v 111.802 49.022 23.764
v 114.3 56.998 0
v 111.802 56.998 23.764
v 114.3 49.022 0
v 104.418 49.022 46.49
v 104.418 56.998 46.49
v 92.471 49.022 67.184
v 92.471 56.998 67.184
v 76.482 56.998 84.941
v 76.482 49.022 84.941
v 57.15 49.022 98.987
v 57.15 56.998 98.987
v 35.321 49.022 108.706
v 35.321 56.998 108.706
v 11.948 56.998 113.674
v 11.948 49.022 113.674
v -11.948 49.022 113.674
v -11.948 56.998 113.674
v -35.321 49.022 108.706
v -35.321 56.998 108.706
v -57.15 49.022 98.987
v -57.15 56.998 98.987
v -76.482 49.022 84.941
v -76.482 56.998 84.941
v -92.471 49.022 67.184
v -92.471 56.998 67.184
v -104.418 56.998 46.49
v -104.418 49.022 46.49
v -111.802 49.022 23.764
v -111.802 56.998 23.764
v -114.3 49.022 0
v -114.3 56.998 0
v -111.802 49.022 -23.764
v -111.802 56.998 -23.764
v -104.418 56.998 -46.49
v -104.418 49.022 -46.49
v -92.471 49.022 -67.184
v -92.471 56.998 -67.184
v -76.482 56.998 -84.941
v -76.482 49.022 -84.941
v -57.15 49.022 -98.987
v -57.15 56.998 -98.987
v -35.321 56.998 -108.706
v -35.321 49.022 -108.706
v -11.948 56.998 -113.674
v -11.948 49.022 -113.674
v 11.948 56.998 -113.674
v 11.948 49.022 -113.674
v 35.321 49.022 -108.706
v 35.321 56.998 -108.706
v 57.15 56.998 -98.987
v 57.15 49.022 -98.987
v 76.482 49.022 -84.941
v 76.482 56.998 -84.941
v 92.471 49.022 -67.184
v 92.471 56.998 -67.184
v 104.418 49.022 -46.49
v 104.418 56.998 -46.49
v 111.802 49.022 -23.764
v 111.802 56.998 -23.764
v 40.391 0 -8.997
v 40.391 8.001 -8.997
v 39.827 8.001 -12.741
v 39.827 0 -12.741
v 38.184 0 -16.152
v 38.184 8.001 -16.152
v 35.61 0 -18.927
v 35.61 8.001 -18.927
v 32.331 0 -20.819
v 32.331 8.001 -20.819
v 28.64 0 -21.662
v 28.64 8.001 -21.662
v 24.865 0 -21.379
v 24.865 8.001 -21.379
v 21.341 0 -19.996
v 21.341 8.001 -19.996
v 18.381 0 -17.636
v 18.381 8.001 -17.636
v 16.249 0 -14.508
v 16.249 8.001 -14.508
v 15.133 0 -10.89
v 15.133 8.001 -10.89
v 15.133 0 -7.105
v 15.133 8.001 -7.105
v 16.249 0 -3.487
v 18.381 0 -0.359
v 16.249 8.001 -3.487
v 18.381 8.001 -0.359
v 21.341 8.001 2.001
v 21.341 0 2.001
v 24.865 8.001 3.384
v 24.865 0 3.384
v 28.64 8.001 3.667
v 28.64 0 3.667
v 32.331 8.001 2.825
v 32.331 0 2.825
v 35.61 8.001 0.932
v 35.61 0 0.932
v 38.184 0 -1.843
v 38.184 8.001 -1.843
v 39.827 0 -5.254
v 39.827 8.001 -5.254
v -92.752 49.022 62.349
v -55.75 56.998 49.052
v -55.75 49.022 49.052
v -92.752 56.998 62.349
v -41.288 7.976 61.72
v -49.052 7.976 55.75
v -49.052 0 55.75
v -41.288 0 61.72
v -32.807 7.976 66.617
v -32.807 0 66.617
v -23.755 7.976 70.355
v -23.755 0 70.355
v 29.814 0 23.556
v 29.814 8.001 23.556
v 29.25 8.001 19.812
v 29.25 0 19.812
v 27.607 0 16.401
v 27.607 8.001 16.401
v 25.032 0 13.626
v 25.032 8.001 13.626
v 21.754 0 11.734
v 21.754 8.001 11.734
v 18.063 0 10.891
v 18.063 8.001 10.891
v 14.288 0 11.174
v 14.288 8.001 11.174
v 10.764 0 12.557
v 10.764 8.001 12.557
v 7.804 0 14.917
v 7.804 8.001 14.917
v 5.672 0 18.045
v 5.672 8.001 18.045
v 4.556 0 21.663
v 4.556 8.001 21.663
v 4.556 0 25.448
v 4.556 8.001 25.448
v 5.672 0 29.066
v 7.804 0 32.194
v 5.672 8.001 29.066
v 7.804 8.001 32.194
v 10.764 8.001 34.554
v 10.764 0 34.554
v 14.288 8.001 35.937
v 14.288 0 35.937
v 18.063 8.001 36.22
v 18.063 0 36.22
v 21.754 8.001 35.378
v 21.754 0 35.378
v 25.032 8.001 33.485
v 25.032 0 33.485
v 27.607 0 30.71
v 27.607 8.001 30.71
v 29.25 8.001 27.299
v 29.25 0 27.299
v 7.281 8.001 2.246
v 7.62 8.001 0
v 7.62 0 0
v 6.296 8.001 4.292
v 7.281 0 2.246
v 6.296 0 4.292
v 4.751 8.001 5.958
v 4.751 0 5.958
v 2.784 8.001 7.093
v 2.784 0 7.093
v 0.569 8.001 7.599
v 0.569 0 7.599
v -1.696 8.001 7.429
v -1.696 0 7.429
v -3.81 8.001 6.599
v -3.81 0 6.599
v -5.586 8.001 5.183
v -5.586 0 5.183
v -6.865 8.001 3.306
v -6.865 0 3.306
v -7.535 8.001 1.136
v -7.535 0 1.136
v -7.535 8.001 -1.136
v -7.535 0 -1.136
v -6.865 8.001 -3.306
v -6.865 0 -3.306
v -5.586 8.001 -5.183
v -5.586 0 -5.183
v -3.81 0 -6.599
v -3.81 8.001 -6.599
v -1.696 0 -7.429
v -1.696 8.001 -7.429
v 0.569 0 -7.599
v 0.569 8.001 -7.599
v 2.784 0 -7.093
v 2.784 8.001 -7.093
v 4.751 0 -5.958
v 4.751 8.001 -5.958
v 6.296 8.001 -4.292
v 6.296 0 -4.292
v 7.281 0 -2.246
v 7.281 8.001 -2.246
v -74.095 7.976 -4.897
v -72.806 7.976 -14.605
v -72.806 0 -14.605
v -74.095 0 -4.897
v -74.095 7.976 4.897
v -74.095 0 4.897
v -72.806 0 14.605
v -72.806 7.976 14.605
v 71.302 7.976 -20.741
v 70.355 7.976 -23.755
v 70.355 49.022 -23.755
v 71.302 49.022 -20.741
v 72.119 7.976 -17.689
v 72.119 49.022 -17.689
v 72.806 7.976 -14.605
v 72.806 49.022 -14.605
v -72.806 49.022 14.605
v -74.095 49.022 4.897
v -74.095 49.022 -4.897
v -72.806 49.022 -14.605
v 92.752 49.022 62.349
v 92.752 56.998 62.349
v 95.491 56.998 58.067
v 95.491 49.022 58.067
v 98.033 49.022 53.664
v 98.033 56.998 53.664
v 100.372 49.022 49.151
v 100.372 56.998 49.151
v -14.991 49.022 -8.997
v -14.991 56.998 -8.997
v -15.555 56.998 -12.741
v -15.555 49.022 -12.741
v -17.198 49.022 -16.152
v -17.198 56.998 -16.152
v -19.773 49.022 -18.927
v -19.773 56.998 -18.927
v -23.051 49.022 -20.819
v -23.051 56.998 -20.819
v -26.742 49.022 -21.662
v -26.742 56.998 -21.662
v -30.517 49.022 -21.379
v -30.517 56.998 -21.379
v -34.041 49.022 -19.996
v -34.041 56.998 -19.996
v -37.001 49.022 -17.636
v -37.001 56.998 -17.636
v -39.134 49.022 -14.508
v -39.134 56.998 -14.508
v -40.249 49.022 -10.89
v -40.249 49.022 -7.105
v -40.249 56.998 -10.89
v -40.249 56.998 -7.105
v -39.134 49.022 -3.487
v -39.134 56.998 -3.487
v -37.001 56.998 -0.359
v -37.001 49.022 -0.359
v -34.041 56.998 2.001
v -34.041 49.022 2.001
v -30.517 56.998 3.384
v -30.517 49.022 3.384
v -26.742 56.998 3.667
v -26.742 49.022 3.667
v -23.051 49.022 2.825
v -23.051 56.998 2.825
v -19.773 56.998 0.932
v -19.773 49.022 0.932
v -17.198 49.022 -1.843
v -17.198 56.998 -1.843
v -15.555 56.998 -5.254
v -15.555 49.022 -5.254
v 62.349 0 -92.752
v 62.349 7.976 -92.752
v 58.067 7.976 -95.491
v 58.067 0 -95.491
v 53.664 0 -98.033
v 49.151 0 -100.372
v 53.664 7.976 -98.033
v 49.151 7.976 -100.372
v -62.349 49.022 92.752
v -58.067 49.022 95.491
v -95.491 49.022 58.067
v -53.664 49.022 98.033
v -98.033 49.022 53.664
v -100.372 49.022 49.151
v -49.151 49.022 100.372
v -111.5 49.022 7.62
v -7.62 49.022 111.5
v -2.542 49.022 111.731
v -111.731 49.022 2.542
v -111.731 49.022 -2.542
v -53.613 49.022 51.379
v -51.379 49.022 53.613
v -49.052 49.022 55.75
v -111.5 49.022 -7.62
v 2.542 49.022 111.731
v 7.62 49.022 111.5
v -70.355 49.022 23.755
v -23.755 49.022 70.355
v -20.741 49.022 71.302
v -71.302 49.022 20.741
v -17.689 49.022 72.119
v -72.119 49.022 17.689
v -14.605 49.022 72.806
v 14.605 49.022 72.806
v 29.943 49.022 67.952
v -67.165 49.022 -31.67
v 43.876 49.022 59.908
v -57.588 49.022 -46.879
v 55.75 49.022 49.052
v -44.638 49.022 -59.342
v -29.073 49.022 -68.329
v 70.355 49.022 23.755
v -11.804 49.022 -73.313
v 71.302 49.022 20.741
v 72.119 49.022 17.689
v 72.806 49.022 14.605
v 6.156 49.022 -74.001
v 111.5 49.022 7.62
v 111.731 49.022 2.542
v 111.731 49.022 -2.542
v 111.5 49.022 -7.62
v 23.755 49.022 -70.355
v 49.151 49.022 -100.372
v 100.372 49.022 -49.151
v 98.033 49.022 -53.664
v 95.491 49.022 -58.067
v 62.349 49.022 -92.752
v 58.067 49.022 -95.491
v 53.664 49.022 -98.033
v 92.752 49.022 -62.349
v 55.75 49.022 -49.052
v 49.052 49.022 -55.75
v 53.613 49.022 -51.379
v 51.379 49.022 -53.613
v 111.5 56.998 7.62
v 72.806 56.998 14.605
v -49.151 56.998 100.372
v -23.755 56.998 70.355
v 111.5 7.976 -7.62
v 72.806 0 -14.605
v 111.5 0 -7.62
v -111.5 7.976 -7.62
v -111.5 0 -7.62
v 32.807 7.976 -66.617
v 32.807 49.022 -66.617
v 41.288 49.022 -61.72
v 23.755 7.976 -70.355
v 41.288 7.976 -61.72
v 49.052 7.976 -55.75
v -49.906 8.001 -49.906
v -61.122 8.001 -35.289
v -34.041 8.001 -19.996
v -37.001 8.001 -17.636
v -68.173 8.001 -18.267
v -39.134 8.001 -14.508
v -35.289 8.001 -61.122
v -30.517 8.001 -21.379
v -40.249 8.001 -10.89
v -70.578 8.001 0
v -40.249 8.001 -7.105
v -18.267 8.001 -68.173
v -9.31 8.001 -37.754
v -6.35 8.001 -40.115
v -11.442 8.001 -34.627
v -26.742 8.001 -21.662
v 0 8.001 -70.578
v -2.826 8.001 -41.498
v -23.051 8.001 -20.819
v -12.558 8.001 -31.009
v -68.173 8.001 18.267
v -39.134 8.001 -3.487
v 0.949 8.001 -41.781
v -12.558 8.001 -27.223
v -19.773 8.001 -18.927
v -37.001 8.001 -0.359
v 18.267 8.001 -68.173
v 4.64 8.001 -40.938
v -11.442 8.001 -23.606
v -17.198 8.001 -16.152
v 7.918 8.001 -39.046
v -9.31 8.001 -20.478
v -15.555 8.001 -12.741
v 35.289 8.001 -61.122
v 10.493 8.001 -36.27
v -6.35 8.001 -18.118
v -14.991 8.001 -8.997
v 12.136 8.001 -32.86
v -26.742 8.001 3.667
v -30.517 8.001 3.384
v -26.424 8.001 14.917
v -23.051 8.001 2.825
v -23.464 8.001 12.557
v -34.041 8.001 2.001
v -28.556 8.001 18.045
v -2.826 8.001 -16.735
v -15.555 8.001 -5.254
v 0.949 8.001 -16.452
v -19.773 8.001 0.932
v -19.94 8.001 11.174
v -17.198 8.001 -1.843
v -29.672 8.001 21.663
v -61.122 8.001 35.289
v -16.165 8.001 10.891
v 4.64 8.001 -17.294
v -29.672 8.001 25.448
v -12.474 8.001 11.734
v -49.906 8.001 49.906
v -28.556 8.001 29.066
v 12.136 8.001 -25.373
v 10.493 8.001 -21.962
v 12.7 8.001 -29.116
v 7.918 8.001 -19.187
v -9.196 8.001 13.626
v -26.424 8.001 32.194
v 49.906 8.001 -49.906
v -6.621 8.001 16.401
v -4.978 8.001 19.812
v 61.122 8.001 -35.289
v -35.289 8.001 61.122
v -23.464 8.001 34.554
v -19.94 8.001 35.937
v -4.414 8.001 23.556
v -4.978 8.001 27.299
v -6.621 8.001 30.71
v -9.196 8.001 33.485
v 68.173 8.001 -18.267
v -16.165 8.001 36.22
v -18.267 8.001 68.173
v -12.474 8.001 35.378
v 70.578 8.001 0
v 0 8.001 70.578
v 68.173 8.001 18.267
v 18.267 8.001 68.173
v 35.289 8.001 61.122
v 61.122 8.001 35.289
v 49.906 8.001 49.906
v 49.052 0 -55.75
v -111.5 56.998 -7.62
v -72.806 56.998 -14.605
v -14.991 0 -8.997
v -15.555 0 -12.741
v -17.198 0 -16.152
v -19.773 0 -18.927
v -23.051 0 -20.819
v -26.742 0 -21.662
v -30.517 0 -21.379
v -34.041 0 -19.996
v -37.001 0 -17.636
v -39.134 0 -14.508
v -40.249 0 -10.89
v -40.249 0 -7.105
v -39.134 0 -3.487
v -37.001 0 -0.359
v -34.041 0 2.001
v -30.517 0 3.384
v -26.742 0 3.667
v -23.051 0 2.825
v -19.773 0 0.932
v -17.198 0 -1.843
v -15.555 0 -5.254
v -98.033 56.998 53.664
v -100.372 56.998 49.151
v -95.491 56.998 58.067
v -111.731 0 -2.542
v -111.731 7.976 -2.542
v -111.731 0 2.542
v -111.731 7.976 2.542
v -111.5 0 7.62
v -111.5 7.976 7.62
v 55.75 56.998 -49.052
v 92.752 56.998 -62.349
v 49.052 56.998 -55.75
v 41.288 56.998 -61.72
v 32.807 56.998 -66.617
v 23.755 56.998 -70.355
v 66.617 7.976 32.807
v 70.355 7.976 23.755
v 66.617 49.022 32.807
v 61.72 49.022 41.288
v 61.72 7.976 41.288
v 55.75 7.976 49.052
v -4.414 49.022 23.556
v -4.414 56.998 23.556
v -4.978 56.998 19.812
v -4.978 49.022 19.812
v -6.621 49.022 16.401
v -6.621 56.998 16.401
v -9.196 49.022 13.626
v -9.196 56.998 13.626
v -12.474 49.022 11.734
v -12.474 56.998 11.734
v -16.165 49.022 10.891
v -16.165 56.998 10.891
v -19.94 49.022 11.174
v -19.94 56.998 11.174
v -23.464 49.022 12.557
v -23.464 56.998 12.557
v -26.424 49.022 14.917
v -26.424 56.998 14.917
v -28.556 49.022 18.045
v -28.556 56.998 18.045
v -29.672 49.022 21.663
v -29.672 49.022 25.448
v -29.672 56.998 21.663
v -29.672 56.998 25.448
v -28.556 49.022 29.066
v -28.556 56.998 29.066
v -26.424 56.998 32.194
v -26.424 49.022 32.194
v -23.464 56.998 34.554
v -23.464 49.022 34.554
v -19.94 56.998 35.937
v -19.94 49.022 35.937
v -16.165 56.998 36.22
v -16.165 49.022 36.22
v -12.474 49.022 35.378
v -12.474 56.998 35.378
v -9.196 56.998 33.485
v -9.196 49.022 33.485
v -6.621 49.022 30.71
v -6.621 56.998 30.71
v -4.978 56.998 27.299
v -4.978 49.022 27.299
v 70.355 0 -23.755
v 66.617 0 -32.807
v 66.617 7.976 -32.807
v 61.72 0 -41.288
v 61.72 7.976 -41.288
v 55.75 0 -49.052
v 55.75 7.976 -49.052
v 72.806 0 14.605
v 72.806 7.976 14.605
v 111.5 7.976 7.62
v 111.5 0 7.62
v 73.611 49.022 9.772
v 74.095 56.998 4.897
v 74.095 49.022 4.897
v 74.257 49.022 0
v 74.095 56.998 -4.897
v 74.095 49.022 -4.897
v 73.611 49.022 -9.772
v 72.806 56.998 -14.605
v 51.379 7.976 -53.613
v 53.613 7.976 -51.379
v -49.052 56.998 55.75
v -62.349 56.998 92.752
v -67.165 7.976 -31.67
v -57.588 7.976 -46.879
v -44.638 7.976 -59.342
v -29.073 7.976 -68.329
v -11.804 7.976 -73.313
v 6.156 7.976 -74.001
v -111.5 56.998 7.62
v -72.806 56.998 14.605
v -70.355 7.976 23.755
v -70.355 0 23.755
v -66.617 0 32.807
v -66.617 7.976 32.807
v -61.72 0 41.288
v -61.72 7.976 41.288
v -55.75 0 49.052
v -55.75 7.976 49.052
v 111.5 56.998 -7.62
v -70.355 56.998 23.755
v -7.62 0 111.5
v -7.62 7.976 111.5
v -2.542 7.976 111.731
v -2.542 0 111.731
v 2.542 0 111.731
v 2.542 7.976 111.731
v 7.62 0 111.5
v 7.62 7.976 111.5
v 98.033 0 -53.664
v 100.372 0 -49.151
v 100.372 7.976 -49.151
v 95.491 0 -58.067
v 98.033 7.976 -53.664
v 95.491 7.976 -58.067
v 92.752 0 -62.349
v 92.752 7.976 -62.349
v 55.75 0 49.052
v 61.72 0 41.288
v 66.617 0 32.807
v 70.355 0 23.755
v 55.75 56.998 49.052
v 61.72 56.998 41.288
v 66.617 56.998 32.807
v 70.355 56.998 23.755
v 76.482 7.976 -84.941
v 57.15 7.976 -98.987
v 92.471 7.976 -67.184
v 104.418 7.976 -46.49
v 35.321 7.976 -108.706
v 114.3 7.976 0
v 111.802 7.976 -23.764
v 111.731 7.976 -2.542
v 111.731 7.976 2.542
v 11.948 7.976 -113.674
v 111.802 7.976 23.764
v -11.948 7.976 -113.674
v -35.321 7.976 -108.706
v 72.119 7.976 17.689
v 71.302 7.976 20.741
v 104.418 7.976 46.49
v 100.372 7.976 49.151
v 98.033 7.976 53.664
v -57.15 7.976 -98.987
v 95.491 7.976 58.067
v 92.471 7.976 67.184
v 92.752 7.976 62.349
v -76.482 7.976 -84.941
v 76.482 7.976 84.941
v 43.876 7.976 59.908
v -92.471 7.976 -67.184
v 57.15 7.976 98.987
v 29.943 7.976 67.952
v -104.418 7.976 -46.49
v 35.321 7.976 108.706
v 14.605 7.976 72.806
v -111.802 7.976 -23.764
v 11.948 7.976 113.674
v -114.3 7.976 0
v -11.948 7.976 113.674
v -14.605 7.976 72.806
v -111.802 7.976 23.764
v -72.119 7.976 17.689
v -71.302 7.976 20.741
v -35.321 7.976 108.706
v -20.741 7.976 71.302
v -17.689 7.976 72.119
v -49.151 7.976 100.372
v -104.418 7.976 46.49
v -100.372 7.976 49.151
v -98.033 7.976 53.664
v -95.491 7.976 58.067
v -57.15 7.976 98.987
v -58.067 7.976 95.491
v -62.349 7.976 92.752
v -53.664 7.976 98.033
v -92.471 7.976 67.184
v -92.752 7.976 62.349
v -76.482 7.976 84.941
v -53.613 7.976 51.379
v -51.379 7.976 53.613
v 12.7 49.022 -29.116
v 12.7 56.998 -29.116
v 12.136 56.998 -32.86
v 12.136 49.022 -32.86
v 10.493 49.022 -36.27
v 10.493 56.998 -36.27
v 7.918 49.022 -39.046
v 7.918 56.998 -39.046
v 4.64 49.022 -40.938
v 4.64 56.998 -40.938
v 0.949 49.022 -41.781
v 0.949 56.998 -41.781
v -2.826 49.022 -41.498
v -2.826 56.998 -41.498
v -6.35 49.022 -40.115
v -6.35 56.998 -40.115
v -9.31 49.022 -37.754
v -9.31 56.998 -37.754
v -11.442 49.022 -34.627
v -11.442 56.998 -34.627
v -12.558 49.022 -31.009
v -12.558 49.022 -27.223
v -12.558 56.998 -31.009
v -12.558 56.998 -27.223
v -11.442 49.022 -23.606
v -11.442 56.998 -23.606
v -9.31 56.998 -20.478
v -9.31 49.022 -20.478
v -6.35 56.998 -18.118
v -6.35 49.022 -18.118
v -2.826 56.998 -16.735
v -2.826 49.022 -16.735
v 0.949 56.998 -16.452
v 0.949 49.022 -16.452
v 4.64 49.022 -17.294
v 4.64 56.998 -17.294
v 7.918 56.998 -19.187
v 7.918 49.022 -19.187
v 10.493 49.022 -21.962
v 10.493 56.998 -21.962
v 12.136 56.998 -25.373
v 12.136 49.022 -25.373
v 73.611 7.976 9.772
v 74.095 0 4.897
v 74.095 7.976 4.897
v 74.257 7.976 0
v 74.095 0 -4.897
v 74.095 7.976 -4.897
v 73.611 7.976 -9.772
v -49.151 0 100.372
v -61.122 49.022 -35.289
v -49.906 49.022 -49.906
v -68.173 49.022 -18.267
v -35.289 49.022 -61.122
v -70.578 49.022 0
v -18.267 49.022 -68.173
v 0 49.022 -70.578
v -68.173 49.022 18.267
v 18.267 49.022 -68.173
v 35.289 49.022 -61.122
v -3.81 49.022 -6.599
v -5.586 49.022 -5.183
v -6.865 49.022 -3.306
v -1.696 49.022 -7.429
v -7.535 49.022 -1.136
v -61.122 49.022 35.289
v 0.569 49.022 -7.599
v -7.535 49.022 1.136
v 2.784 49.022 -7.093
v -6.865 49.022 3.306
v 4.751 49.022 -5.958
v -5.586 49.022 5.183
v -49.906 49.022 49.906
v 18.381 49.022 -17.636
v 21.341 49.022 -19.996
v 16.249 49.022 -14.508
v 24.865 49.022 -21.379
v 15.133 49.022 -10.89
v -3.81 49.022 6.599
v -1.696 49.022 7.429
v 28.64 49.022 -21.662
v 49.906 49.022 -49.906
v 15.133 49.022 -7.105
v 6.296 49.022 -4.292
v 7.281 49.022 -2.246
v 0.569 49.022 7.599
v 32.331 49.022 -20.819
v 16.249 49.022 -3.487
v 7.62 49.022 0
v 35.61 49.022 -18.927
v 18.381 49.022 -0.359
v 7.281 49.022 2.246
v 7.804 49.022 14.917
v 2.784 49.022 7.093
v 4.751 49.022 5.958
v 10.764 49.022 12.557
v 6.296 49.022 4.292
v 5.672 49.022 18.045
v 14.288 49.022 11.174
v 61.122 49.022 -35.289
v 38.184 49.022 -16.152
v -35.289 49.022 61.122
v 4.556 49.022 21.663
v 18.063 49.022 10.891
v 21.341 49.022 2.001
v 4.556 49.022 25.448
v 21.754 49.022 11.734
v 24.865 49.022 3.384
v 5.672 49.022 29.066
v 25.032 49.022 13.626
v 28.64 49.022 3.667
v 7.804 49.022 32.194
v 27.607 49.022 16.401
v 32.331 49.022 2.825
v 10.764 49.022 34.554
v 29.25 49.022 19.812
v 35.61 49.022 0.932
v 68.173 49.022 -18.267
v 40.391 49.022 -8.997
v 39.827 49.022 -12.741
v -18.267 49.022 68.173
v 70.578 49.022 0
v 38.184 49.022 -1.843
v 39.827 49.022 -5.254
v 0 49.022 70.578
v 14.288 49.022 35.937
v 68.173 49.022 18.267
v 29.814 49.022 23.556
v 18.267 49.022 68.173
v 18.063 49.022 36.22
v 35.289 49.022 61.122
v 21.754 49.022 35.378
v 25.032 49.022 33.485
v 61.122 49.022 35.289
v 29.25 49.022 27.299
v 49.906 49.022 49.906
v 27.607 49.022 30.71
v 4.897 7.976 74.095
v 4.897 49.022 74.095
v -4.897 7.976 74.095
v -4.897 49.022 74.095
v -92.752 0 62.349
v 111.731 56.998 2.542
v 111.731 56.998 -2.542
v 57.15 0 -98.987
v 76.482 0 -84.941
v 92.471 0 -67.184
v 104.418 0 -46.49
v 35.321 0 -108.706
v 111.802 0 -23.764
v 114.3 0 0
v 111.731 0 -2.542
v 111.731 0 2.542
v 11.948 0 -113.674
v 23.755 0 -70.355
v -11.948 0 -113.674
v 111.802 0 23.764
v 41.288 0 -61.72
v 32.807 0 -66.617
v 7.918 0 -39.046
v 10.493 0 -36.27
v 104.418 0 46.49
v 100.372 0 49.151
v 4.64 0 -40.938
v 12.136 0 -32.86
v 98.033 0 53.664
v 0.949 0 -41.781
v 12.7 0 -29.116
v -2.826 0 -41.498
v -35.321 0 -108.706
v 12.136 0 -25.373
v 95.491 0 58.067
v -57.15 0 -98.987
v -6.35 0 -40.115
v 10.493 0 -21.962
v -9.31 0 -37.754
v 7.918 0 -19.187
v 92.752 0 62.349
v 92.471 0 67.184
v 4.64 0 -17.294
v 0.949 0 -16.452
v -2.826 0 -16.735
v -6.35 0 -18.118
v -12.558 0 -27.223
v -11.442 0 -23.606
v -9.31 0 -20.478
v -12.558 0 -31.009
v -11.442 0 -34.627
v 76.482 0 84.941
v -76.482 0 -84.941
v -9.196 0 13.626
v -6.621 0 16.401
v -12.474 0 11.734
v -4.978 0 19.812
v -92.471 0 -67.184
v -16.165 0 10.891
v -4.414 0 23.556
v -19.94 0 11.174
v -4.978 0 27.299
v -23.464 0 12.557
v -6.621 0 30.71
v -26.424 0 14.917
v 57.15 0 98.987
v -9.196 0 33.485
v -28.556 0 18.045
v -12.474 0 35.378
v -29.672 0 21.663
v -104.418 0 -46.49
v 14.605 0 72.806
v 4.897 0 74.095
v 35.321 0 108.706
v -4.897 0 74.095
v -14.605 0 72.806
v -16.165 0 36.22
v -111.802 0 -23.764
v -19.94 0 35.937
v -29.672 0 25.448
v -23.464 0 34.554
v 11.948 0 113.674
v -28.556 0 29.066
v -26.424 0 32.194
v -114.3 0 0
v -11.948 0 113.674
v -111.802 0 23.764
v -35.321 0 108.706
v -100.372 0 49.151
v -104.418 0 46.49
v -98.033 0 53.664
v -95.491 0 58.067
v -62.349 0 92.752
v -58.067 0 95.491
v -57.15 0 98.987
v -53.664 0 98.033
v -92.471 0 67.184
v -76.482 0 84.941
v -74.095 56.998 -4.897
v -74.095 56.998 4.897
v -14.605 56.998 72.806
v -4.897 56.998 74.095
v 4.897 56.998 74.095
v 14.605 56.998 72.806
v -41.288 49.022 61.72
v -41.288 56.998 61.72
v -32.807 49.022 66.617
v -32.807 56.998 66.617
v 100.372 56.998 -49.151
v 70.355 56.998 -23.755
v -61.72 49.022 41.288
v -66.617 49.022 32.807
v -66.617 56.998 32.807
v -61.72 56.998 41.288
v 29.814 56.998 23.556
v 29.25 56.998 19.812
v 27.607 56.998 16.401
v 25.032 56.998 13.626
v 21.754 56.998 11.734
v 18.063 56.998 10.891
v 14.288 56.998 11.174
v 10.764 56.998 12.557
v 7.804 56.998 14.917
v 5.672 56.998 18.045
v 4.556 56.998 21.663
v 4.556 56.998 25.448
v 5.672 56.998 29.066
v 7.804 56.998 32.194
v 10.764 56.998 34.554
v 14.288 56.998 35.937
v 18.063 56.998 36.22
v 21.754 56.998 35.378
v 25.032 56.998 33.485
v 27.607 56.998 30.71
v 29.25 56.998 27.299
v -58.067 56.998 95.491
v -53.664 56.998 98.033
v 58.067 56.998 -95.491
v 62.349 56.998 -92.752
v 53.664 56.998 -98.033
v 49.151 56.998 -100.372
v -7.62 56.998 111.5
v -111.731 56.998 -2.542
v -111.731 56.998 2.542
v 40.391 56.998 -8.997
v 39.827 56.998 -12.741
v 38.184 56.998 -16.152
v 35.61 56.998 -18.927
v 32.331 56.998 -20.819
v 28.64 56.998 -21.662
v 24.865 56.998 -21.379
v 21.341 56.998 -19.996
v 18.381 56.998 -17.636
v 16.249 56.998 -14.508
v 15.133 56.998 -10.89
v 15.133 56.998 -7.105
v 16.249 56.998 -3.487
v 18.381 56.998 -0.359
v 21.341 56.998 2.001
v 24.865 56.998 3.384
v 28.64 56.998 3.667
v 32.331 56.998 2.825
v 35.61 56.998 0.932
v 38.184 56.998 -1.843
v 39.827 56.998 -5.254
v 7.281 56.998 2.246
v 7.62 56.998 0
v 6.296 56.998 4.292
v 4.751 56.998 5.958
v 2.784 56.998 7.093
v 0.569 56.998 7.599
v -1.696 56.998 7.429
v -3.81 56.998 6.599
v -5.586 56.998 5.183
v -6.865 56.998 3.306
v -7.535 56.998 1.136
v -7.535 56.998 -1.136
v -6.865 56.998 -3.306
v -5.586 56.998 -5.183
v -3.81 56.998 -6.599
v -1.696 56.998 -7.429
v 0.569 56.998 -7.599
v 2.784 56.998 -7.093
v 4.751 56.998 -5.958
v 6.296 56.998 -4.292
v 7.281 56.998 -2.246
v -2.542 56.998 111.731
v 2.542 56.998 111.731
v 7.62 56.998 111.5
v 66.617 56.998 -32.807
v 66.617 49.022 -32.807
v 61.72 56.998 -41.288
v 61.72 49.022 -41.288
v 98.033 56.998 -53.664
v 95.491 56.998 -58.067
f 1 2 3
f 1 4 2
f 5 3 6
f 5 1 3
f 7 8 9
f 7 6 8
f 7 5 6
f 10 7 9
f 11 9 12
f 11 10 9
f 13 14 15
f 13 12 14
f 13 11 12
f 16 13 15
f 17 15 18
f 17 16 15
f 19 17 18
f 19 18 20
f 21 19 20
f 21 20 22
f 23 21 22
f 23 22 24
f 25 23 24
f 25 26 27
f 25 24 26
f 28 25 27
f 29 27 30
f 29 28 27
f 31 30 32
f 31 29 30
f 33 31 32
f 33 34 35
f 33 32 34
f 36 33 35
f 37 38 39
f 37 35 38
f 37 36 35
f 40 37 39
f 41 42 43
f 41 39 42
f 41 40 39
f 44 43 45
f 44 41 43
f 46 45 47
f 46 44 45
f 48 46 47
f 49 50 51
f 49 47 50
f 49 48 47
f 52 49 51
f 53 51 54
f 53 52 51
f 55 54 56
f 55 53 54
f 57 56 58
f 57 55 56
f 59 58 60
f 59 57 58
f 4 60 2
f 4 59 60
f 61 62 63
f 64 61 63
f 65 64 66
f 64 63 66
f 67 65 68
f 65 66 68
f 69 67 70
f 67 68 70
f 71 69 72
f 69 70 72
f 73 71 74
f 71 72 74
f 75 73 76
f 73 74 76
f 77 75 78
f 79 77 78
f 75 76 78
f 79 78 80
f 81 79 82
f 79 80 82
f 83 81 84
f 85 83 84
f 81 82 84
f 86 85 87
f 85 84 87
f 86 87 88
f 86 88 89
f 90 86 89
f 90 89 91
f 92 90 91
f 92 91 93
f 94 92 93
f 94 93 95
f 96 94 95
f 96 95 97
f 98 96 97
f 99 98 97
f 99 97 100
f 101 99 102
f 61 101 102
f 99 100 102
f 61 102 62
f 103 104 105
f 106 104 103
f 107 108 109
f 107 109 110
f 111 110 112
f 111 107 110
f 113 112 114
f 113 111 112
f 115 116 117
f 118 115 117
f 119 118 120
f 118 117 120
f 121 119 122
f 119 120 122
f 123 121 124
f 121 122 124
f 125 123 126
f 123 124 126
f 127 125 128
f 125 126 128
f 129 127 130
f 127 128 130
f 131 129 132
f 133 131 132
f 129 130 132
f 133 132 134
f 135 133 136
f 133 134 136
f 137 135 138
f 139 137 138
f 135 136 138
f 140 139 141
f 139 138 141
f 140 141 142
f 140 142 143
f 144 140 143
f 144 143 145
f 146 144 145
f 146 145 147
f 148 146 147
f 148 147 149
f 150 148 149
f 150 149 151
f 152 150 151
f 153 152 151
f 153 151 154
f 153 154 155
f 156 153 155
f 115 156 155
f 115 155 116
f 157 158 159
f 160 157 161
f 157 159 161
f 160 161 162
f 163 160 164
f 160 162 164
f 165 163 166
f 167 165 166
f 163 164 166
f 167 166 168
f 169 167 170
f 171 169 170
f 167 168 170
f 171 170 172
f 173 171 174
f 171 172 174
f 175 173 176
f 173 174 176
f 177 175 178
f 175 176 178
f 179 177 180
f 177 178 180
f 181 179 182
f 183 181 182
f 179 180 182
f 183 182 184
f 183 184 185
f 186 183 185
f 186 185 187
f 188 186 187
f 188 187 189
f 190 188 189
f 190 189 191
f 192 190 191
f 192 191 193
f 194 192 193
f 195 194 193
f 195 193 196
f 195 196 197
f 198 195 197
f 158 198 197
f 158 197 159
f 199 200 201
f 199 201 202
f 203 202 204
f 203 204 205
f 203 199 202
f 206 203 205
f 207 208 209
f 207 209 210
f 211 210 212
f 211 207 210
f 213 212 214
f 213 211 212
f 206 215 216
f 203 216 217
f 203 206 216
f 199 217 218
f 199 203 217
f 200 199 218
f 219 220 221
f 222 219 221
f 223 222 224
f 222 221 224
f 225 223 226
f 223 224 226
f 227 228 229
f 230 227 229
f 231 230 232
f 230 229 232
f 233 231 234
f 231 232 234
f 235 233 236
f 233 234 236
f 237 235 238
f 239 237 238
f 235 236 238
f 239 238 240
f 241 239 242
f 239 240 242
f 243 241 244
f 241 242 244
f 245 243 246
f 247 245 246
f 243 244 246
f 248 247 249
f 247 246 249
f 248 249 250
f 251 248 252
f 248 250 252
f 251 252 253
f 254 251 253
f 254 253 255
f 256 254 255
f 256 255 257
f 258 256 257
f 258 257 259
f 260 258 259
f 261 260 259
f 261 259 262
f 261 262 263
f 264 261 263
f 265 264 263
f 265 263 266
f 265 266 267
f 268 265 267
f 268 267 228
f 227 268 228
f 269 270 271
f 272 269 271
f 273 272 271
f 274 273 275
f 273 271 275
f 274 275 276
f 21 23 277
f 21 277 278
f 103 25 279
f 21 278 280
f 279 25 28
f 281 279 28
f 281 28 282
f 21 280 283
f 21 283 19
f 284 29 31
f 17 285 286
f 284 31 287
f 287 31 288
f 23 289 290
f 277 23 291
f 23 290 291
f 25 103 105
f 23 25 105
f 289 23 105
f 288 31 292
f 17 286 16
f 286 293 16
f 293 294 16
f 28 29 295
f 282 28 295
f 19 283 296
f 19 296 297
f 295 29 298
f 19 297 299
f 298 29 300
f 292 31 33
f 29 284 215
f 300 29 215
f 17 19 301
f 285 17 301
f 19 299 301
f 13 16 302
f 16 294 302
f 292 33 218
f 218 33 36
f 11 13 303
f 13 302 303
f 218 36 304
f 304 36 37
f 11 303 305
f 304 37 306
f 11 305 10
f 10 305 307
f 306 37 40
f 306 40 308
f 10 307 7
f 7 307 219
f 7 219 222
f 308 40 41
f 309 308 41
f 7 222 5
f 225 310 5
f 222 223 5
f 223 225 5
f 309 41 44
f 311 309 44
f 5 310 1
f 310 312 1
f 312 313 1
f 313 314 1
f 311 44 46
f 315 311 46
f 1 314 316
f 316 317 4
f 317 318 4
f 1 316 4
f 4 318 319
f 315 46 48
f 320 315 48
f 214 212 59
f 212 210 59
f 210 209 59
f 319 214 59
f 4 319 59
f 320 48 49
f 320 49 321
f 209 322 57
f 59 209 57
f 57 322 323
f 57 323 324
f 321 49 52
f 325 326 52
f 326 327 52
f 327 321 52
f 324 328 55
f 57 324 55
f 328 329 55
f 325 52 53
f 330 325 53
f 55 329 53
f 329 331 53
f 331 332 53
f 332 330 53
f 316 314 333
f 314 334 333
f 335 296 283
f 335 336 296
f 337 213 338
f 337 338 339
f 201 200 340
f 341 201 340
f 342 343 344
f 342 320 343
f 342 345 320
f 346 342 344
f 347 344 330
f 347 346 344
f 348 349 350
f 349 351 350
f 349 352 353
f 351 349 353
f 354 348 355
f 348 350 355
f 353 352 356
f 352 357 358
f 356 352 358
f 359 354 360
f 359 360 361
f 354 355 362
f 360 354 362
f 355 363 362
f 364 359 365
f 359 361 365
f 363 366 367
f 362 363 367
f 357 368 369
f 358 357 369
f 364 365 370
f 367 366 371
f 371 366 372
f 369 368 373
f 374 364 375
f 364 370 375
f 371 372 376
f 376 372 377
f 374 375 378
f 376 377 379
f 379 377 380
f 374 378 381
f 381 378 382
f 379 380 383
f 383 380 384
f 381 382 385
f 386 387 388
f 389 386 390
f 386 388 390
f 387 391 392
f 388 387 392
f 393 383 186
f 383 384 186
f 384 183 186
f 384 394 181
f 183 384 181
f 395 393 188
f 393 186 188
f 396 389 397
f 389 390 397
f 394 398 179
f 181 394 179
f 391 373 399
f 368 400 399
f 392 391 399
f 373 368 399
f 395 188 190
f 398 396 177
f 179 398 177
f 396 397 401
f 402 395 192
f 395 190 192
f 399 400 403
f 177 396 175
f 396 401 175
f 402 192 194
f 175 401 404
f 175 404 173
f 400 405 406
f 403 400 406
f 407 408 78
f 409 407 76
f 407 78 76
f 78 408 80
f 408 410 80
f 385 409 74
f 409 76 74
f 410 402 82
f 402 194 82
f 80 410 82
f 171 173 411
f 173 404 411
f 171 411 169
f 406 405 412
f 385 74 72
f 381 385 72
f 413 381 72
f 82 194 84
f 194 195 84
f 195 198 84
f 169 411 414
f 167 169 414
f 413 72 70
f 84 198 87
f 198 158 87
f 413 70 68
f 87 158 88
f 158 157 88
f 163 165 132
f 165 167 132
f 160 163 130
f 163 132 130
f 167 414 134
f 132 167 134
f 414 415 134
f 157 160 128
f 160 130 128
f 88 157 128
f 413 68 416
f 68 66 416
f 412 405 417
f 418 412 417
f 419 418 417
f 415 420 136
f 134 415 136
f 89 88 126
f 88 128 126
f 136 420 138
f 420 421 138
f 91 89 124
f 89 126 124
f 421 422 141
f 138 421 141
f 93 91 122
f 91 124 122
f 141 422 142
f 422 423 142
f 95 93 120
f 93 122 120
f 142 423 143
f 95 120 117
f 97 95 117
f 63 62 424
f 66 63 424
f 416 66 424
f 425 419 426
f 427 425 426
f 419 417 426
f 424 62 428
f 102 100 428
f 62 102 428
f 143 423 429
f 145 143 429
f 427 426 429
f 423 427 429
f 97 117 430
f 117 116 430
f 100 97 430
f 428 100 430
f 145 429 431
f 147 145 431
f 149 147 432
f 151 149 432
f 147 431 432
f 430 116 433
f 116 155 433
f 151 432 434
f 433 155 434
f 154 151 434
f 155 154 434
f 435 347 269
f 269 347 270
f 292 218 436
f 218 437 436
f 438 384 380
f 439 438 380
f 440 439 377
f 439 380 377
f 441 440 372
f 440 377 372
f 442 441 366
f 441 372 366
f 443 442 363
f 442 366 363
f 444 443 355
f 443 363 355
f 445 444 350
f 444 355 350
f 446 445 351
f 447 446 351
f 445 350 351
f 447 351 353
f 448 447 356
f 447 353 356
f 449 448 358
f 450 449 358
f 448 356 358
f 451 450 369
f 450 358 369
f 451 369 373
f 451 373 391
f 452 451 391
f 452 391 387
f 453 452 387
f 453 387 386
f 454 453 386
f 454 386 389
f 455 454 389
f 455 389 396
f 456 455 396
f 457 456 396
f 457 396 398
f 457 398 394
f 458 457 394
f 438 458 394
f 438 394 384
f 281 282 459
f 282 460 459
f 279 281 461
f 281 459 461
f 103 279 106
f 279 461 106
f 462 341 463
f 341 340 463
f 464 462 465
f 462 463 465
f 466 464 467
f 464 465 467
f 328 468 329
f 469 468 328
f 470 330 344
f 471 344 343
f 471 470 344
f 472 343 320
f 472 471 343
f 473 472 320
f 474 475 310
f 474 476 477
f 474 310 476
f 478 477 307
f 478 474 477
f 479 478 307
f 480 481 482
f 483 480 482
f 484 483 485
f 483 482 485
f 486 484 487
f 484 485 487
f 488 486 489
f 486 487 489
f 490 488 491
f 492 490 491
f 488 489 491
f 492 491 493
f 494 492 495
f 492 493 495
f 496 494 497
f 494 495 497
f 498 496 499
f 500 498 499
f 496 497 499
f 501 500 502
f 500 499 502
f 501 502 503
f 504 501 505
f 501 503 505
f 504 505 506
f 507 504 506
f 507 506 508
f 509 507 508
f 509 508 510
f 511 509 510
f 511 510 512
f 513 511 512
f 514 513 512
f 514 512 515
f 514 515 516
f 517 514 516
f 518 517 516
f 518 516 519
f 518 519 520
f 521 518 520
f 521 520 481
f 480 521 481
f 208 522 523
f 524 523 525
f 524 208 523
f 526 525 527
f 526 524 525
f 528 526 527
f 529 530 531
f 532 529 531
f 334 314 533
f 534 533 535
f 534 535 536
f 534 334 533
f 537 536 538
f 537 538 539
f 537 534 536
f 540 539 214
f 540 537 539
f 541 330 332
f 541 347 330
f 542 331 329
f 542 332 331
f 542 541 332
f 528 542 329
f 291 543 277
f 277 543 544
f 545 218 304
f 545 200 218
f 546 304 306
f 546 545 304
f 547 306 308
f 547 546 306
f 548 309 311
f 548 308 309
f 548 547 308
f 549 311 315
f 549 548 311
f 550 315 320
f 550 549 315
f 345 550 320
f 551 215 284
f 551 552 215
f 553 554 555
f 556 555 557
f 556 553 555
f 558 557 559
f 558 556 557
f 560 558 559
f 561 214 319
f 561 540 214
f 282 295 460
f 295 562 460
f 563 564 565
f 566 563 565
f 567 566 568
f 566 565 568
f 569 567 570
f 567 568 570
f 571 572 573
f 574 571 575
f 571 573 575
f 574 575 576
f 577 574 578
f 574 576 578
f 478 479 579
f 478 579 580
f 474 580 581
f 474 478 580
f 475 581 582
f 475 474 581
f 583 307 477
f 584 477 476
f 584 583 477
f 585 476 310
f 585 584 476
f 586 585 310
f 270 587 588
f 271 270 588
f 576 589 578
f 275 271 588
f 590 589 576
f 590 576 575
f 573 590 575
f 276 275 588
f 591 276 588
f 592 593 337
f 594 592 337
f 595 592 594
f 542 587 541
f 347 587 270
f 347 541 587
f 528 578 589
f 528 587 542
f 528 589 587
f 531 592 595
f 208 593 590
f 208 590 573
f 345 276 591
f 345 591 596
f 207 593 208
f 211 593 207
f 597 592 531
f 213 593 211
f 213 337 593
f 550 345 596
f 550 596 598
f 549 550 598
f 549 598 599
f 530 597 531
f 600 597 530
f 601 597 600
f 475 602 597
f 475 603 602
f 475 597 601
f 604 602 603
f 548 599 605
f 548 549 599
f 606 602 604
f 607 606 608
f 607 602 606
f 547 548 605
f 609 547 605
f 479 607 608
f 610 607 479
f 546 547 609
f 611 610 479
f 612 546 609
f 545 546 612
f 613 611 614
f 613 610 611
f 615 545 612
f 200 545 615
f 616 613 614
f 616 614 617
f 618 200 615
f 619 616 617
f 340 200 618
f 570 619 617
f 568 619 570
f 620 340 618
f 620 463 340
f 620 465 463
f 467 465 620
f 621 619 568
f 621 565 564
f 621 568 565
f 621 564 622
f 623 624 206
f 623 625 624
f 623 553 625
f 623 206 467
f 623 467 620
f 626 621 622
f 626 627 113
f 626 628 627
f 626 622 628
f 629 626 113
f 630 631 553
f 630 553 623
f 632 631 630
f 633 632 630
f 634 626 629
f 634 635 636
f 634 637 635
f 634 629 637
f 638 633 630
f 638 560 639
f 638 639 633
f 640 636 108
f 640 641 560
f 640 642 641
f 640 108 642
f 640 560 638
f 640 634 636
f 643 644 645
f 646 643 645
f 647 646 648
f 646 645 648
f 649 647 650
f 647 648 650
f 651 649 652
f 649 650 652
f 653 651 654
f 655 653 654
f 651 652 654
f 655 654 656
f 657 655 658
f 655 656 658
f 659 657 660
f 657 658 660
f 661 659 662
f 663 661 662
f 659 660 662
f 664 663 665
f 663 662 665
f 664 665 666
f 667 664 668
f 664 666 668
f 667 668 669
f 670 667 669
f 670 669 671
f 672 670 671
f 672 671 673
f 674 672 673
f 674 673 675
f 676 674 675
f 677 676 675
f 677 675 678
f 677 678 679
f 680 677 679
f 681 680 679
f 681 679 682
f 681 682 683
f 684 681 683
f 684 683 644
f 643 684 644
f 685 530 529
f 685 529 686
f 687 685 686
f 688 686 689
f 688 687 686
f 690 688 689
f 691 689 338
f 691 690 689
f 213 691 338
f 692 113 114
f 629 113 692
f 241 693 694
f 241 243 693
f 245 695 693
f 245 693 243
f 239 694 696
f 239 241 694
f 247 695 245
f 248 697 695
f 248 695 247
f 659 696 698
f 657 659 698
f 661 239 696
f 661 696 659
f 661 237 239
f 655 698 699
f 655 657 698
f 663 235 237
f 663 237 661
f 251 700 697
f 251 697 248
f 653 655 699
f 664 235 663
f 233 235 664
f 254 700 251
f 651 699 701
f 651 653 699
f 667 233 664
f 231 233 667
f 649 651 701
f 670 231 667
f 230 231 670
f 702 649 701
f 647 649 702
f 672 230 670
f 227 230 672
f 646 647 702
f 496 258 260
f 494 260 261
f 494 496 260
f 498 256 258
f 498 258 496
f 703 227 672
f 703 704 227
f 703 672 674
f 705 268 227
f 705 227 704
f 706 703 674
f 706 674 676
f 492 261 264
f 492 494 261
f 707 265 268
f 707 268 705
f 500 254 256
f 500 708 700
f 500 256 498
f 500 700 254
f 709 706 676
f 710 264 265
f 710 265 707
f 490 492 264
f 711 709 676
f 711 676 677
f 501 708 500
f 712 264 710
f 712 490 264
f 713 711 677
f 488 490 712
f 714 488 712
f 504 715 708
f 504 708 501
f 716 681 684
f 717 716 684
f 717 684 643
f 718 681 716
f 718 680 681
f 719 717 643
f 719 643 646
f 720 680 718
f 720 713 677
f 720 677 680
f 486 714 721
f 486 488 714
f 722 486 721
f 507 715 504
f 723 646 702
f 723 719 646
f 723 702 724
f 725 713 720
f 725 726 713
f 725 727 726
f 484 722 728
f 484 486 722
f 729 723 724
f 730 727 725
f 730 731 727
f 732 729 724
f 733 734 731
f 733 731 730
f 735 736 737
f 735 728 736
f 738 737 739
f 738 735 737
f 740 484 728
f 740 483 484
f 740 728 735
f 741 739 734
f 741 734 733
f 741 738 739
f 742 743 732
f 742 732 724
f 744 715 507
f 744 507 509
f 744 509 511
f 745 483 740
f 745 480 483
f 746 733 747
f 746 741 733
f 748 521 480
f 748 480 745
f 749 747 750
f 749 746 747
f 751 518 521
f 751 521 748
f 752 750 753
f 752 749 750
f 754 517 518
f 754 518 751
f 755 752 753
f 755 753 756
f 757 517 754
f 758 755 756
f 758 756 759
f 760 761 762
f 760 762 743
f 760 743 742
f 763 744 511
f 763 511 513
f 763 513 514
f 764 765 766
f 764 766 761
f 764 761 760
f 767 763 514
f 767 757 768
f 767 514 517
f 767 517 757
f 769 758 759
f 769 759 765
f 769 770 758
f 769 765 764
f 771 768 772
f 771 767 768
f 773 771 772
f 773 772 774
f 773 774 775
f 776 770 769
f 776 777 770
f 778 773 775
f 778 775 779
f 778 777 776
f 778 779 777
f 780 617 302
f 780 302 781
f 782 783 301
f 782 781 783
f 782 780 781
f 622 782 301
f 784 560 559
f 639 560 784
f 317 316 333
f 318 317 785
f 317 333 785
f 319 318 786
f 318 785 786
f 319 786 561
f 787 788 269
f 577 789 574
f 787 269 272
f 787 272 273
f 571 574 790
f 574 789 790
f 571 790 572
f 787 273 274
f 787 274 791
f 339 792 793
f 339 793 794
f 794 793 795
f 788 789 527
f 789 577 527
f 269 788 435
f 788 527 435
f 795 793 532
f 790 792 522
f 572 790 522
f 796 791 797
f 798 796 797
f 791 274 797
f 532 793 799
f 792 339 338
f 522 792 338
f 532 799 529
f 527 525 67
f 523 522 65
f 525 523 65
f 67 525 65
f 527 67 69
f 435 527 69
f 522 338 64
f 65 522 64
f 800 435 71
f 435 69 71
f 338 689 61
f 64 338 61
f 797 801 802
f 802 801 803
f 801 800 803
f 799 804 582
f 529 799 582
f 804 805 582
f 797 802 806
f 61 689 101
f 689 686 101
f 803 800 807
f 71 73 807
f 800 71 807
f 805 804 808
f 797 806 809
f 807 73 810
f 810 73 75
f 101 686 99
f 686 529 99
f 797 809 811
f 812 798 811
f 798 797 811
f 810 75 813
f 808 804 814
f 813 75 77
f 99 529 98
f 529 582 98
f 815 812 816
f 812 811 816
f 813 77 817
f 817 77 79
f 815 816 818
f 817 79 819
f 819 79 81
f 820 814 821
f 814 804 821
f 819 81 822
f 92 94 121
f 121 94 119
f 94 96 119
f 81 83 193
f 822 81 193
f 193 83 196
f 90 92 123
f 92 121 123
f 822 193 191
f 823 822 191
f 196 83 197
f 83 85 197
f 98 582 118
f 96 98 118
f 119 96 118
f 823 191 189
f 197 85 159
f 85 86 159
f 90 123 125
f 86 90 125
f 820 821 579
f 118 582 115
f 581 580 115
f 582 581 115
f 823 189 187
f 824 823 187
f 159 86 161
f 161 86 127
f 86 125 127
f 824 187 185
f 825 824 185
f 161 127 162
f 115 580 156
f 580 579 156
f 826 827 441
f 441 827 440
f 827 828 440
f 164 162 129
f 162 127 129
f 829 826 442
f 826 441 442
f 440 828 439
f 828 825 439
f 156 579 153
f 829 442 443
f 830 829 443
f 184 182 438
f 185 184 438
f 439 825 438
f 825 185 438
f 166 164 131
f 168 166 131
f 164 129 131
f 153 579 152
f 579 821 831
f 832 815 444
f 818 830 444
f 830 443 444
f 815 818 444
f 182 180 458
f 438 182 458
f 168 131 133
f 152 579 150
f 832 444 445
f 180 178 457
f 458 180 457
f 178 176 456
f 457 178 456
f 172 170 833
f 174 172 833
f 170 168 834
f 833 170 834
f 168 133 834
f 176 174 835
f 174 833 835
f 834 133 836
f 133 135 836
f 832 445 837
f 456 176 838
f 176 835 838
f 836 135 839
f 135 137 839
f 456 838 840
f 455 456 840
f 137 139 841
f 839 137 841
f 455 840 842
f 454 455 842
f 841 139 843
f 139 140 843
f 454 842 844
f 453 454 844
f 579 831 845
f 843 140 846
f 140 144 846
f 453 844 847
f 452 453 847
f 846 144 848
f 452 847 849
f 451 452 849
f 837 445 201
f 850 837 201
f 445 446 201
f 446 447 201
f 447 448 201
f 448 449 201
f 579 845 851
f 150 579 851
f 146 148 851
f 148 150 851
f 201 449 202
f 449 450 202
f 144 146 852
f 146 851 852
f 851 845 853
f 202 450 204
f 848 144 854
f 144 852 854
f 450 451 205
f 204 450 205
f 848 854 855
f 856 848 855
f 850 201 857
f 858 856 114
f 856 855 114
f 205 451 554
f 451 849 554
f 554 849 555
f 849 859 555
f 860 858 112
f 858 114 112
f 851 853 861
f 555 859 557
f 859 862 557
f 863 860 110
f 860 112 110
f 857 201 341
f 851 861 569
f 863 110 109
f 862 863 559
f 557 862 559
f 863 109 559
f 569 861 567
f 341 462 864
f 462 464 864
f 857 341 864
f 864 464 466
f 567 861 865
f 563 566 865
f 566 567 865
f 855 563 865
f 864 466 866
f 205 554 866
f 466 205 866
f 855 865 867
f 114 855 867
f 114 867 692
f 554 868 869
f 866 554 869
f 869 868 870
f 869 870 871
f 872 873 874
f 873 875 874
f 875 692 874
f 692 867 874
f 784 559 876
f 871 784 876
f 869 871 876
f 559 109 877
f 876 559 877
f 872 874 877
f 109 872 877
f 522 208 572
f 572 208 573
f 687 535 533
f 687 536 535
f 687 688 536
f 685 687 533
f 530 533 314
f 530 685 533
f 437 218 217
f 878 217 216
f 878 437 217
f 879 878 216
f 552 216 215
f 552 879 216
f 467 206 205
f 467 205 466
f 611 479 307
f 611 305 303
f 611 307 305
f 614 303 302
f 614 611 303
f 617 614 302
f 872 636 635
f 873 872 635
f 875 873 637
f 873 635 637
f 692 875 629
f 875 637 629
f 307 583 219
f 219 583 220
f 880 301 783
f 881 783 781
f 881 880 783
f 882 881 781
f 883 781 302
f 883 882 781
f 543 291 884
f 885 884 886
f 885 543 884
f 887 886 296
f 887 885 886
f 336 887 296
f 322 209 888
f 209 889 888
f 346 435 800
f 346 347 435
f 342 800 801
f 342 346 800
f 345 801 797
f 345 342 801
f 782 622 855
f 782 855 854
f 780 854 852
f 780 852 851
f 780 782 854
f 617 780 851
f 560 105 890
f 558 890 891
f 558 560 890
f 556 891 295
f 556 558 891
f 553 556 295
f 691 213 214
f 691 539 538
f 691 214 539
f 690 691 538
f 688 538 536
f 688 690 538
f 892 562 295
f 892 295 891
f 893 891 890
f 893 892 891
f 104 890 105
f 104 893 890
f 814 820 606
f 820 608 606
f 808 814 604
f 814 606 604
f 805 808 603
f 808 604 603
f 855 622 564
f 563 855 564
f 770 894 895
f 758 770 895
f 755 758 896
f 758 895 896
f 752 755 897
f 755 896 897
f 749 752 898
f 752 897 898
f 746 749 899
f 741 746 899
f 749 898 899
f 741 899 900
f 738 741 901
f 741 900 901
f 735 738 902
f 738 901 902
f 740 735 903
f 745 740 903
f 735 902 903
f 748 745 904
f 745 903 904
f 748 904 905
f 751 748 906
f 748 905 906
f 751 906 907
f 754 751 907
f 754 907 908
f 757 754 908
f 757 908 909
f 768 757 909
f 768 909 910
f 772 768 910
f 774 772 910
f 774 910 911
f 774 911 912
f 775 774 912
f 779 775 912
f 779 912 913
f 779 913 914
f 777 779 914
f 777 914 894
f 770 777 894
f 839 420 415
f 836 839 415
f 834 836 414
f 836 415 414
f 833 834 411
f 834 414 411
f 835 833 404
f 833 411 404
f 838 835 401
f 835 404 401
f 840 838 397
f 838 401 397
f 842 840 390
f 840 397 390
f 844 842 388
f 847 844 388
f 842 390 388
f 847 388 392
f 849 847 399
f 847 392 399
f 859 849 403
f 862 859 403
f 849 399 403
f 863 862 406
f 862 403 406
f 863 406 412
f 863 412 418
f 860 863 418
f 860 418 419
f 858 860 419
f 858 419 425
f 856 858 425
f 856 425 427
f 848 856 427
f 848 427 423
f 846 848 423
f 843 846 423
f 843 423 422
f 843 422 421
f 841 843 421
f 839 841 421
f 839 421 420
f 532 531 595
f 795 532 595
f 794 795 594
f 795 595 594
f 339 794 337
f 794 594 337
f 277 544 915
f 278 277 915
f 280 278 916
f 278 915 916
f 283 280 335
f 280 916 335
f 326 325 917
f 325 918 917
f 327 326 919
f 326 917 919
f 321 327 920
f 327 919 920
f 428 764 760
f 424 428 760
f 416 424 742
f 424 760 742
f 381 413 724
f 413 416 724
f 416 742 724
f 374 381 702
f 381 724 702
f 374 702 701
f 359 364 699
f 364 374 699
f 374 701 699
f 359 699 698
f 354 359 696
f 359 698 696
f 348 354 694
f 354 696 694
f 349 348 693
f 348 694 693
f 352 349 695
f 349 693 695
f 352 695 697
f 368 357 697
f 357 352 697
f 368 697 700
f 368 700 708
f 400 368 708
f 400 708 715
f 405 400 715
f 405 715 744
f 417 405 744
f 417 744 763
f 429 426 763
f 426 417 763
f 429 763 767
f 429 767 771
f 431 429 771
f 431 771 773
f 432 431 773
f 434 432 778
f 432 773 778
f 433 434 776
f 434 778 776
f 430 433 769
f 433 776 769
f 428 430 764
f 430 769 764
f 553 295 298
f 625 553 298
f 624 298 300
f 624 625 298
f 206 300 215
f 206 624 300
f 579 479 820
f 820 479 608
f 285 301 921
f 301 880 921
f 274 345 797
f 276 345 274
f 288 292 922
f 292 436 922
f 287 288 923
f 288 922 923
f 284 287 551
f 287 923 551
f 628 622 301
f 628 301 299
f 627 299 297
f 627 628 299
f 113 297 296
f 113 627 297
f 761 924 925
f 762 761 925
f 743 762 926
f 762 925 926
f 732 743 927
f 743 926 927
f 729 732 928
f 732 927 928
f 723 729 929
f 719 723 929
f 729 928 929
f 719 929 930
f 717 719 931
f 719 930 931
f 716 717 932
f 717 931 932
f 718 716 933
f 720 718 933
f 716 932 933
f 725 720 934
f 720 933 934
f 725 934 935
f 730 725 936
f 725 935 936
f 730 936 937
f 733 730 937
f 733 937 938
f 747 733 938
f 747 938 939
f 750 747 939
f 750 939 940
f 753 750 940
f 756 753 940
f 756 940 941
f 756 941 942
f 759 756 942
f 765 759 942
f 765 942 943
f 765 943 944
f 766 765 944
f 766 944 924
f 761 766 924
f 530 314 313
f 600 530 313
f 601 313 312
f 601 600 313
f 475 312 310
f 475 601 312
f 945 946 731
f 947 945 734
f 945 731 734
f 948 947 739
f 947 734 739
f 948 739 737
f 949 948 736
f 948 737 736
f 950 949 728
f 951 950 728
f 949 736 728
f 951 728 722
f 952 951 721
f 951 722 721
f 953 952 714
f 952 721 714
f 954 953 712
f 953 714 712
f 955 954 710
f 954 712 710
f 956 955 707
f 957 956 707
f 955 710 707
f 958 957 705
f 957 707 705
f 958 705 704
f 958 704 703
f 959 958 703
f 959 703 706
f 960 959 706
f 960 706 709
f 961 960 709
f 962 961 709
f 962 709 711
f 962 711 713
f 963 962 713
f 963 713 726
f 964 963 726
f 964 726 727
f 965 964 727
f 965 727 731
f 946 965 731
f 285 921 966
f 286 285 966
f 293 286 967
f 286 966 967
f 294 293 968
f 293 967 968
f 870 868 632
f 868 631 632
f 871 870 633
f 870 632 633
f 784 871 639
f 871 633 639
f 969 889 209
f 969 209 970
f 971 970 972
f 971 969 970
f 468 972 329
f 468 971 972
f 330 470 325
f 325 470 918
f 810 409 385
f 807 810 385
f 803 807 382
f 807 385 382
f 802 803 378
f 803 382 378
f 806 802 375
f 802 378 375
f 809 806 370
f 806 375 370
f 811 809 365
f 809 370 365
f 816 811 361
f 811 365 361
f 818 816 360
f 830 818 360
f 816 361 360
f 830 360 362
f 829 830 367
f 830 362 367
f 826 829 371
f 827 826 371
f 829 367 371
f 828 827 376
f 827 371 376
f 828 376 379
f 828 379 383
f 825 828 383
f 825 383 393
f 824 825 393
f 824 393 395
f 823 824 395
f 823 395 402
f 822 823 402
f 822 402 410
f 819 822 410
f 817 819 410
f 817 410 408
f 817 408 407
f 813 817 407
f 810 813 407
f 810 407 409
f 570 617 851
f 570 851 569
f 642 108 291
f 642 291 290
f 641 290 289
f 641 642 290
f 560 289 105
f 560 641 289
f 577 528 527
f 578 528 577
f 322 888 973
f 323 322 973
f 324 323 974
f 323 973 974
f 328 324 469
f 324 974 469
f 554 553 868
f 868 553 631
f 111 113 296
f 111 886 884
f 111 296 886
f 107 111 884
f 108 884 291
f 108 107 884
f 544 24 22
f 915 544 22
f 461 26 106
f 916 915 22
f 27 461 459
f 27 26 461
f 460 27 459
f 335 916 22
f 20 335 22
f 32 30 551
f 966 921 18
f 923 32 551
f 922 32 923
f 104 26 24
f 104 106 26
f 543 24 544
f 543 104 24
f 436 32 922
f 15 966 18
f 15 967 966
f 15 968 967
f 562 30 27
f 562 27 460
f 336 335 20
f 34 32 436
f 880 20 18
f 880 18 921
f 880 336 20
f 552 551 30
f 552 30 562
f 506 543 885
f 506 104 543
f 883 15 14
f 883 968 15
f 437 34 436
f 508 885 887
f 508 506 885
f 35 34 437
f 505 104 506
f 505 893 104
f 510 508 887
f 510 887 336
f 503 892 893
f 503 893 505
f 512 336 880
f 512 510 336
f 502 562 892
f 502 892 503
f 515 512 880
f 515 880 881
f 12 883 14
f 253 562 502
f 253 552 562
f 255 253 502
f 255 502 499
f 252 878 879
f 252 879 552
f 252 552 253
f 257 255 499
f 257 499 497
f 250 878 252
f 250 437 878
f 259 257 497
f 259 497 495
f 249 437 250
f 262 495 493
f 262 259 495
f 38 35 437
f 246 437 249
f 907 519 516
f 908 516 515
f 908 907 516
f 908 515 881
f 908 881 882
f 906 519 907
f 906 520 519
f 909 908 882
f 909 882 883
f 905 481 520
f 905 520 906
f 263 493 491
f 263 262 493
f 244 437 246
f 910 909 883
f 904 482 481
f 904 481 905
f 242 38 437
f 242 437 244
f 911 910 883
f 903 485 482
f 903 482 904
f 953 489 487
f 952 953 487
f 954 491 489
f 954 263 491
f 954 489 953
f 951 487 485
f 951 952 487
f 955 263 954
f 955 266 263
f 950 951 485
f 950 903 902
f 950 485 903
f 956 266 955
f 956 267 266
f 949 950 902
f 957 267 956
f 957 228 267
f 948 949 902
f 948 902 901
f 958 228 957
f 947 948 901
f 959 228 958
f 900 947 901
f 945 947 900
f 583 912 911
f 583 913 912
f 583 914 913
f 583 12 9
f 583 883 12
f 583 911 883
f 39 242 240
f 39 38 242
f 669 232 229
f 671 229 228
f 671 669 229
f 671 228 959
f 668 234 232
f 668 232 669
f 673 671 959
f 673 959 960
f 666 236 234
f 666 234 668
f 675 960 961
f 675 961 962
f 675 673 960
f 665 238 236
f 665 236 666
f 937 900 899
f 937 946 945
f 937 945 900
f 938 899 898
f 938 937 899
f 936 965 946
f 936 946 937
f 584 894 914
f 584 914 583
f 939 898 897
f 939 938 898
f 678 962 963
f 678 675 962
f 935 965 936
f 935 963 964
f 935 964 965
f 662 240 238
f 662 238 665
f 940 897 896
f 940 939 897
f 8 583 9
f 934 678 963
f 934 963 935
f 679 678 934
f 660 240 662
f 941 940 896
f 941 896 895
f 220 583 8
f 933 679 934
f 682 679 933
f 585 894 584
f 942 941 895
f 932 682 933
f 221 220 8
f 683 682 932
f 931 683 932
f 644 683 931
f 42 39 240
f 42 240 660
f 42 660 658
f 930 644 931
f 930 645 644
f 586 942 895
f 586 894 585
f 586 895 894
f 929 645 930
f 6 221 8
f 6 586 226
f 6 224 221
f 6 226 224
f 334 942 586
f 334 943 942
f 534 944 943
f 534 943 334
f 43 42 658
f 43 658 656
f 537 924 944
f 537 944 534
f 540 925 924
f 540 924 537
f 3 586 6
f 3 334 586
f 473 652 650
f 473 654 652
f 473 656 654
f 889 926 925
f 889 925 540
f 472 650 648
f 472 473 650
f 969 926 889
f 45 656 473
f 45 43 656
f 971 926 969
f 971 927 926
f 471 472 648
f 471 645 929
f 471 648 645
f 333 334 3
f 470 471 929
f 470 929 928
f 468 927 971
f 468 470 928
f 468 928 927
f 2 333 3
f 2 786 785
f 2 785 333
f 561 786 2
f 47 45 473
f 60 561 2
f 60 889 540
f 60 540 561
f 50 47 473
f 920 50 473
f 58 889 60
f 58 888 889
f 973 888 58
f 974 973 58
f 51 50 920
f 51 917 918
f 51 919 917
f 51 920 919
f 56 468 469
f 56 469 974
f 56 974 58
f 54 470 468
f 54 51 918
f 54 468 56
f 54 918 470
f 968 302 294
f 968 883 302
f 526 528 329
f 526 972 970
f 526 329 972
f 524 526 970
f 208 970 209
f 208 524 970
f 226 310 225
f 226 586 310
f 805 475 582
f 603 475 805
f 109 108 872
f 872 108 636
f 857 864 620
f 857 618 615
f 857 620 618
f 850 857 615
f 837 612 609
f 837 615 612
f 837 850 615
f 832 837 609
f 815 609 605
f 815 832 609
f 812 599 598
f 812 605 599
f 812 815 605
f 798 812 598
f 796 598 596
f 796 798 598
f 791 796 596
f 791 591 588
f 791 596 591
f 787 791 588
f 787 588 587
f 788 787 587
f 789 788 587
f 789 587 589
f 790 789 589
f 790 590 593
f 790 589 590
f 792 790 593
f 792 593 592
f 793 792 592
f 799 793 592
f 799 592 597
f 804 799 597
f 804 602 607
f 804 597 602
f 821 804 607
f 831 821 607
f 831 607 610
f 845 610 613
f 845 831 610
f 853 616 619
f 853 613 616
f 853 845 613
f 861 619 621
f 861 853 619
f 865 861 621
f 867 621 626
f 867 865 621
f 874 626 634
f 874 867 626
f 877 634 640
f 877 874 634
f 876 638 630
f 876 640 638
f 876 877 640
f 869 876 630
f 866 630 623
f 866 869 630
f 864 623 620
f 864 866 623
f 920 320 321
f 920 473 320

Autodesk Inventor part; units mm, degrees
ref_plane "YZ Plane" through (0, 0, 0) normal (1, 0, 0) x (0, 1, 0)
ref_plane "XZ Plane" through (0, 0, 0) normal (0, 1, 0) x (-1, 0, 0)
ref_plane "XY Plane" through (0, 0, 0) normal (0, 0, 1) x (1, 0, 0)
sketch "Sketch1" plane through (0, 0, 0) normal (0, 1, 0) x (-1, 0, 0)
  circle A0 centre (0, 0) radius 114.3
  dimension "d0" = 228.6
extrude "Extrusion1" add sketch "Sketch1" along normal blind 7.9756
sketch "Sketch2" plane through (0, 7.9756, 0) normal (0, 1, 0) x (1, 0, 0)
  circle A0 centre (0, 0) radius 114.3
  circle A1 centre (0, 0) radius 74.2569
  dimension "d3" = 148.5138
extrude "Extrusion2" add sketch "Sketch2" along normal blind 41.0464 contours A1
sketch "Sketch3" plane through (0, 49.022, 0) normal (0, 1, 0) x (1, 0, 0)
  circle A0 centre (0, 0) radius 74.2569
  circle A1 centre (0, 0) radius 114.3
  dimension "d6" = 228.6
extrude "Extrusion3" add sketch "Sketch3" along normal blind 7.9756 contours A0 | A1
sketch "Sketch4" plane through (0, 56.9976, 0) normal (0, 1, 0) x (1, 0, 0)
  circle A0 centre (0, 0) radius 114.3
  circle A1 centre (0, 0) radius 111.76
  circle A2 centre (0, 0) radius 74.2569
  line L0 (14.605, 72.8065) -> (7.62, 111.4999)
  line L1 (-14.605, 72.8065) -> (-7.62, 111.4999)
  line L2 (0, 0) -> (0, 82.3144)
  circle A3 centre (0, 0) radius 111.76
  circle A4 centre (0, 0) radius 74.2569
  line L3 (-23.7549, 70.3547) -> (-49.1508, 100.3718)
  line L4 (-49.0515, 55.7497) -> (-62.3491, 92.7518)
  circle A5 centre (0, 0) radius 111.76
  circle A6 centre (0, 0) radius 74.2569
  line L5 (-55.7497, 49.0515) -> (-92.7518, 62.3491)
  line L6 (-70.3547, 23.7549) -> (-100.3718, 49.1508)
  circle A7 centre (0, 0) radius 111.76
  circle A8 centre (0, 0) radius 74.2569
  line L7 (-72.8065, 14.605) -> (-111.4999, 7.62)
  line L8 (-72.8065, -14.605) -> (-111.4999, -7.62)
  circle A9 centre (0, 0) radius 111.76
  circle A10 centre (0, 0) radius 74.2569
  line L9 (-70.3547, -23.7549) -> (-100.3718, -49.1508)
  line L10 (-55.7497, -49.0515) -> (-92.7518, -62.3491)
  circle A11 centre (0, 0) radius 111.76
  circle A12 centre (0, 0) radius 74.2569
  line L11 (-49.0515, -55.7497) -> (-62.3491, -92.7518)
  line L12 (-23.7549, -70.3547) -> (-49.1508, -100.3718)
  circle A13 centre (0, 0) radius 111.76
  circle A14 centre (0, 0) radius 74.2569
  line L13 (-14.605, -72.8065) -> (-7.62, -111.4999)
  line L14 (14.605, -72.8065) -> (7.62, -111.4999)
  circle A15 centre (0, 0) radius 111.76
  circle A16 centre (0, 0) radius 74.2569
  line L15 (23.7549, -70.3547) -> (49.1508, -100.3718)
  line L16 (49.0515, -55.7497) -> (62.3491, -92.7518)
  circle A17 centre (0, 0) radius 111.76
  circle A18 centre (0, 0) radius 74.2569
  line L17 (55.7497, -49.0515) -> (92.7518, -62.3491)
  line L18 (70.3547, -23.7549) -> (100.3718, -49.1508)
  circle A19 centre (0, 0) radius 111.76
  circle A20 centre (0, 0) radius 74.2569
  line L19 (72.8065, -14.605) -> (111.4999, -7.62)
  line L20 (72.8065, 14.605) -> (111.4999, 7.62)
  circle A21 centre (0, 0) radius 111.76
  circle A22 centre (0, 0) radius 74.2569
  line L21 (70.3547, 23.7549) -> (100.3718, 49.1508)
  line L22 (55.7497, 49.0515) -> (92.7518, 62.3491)
  circle A23 centre (0, 0) radius 111.76
  circle A24 centre (0, 0) radius 74.2569
  line L23 (49.0515, 55.7497) -> (62.3491, 92.7518)
  line L24 (23.7549, 70.3547) -> (49.1508, 100.3718)
  dimension "d10" = 148.5138
  dimension "d11" = 29.21
  dimension "d12" = 14.605
  dimension "d13" = 15.24
  dimension "d14" = 7.62
  dimension "d17" = 360
extrude "Extrusion4" cut sketch "Sketch4" against normal blind 12700 contours A1 L19 A2 L20 | L21 A2 L22 A1 | A1 L17 A2 L18 | L23 A2 L24 A1 | A1 L13 A2 L14 | A1 L11 A2 L12 | A1 L9 A2 L10 | L7 A2 L8 A1
sketch "Sketch5" plane through (0, 56.9976, 0) normal (0, 1, 0) x (1, 0, 0)
  arc A0 (100.3718, 49.1508) -> (92.7518, 62.3491) centre (0, 0) ccw
  circle A1 centre (0, 29.1163) radius 12.7
  circle A2 centre (-27.6912, 8.9974) radius 12.7
  circle A3 centre (-17.1141, -23.5556) radius 12.7
  circle A4 centre (17.1141, -23.5556) radius 12.7
  circle A5 centre (27.6912, 8.9974) radius 12.7
  dimension "d21" = 25.4
  dimension "d24" = 360
extrude "Extrusion5" cut sketch "Sketch5" against normal blind 12700
sketch "Sketch6" plane through (0, 49.022, 0) normal (0, -1, 0) x (1, 0, 0)
  arc A0 (70.3547, -23.7549) -> (72.8065, -14.605) centre (0, 0) ccw
  circle A1 centre (0, 0) radius 70.5777
extrude "Extrusion6" cut sketch "Sketch6" along normal blind 41.021
sketch "Sketch7" plane through (0, 0, 0) normal (0, -1, 0) x (1, 0, 0)
  circle A0 centre (0, 0) radius 114.3
  circle A1 centre (0, 0) radius 7.62
  dimension "d30" = 15.24
extrude "Extrusion7" cut sketch "Sketch7" against normal blind 174.879 contours A1
properties part number "Wheel"
